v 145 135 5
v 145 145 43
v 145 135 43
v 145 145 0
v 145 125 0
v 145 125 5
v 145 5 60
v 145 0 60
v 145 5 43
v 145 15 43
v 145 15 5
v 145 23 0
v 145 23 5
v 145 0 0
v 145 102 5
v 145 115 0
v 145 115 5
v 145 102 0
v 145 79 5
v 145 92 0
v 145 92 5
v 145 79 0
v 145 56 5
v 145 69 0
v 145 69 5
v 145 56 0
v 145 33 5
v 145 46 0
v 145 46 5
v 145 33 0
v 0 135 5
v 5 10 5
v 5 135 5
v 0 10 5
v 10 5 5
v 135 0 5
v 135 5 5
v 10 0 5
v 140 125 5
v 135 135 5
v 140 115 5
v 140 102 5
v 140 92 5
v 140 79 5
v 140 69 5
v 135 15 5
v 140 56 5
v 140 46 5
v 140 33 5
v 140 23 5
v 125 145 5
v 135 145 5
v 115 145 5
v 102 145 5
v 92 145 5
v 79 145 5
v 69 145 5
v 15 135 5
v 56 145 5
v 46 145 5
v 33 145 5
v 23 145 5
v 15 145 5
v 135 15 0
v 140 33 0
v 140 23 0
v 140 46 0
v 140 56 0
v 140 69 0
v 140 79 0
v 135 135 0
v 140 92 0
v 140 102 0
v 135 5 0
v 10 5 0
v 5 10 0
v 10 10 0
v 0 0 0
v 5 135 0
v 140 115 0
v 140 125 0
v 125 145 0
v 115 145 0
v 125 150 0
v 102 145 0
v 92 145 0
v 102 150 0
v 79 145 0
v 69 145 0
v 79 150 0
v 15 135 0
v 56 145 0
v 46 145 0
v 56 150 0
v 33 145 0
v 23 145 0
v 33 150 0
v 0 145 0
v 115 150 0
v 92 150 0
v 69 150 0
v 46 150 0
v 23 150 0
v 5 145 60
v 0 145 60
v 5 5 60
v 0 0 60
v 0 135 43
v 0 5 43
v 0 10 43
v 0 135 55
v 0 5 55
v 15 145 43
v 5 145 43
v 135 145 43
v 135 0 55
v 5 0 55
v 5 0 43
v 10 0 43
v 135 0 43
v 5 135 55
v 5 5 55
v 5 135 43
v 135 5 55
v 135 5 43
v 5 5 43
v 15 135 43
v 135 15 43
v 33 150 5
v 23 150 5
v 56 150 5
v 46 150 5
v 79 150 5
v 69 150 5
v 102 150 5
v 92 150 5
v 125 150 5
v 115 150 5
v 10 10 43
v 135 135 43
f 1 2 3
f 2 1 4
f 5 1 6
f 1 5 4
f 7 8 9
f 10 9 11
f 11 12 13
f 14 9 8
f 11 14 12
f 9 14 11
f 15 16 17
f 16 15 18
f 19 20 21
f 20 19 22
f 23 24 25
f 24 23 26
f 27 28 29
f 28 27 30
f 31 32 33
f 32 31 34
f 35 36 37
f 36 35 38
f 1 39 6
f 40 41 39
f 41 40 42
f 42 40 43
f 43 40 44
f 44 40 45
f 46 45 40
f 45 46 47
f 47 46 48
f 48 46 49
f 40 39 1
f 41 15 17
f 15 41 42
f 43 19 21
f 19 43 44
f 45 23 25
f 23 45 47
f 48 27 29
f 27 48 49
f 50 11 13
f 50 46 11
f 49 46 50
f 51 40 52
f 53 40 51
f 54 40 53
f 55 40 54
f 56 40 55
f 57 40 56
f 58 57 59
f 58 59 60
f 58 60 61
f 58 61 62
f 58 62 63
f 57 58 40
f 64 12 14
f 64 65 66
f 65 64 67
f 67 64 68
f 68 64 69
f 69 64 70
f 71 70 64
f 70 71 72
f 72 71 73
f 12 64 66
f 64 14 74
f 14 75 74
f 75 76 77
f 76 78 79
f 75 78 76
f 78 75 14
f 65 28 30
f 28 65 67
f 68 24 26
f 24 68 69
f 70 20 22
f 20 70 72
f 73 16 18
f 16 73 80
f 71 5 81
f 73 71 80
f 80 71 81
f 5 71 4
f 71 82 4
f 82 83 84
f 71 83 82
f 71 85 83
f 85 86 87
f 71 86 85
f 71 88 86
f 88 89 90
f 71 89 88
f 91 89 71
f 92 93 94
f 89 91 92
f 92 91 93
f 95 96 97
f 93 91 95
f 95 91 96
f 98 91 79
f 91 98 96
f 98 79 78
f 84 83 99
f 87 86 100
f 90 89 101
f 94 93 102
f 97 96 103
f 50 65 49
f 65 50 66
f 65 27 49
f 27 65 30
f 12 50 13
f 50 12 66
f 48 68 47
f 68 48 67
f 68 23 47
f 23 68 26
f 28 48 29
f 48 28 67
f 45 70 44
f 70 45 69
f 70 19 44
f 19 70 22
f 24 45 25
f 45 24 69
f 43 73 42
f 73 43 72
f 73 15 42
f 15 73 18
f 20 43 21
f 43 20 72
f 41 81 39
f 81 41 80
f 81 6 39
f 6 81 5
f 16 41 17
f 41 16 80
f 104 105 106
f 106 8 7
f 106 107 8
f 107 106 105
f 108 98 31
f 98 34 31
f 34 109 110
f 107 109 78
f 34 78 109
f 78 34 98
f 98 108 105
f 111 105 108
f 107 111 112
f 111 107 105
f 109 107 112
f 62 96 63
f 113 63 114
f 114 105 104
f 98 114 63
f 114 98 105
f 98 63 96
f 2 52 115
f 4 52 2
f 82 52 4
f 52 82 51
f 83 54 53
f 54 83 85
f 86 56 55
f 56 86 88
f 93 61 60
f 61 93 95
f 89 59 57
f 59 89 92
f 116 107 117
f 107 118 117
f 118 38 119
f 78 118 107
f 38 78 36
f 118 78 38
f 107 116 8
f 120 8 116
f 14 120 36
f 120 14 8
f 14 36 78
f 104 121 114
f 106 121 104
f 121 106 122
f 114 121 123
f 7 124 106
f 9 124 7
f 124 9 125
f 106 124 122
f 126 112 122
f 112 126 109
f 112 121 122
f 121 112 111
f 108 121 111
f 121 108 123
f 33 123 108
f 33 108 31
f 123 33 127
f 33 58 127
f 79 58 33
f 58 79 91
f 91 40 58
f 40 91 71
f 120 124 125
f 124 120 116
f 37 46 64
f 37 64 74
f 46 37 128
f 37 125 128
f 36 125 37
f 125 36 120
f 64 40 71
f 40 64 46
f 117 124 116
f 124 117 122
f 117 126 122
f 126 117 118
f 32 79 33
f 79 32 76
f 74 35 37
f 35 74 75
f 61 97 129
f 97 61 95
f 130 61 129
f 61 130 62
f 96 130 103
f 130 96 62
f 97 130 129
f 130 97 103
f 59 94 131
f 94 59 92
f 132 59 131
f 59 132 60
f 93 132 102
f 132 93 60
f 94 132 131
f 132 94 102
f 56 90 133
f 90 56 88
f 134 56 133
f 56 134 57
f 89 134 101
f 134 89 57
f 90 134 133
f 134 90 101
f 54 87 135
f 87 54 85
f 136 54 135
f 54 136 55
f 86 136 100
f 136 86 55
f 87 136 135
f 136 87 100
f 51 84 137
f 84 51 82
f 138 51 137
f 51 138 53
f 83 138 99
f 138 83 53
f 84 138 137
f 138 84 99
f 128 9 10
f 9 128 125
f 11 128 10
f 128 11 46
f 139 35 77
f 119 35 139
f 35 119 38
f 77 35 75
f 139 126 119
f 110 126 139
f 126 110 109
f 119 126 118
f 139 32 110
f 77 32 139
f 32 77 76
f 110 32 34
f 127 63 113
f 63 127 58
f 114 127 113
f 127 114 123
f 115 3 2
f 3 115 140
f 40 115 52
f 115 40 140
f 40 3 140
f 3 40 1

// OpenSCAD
// roof is ~75mm
// fan is ~27mm tall
// put fan at 43mm, leaves 5mm
difference(){
    cube([145,145,60]);
    translate([5,5,5]){
        cube([140,140,70]);
    }
    translate([0, 5, 5]){
        cube([5, 130, 50]);
    }
    translate([5, 0, 5]){
        cube([130, 5, 50]);
    }
    translate([5, 5, 0]){
       cube([130, 130, 5]);
    }
    for(i = [1:5]){
        translate([140, i * 23, 0]){
            cube([5, 10, 5]);
        }
    }
}
translate([135,0,0]){
    cube([10, 15, 43]);
}
cube([10,10,43]);
translate([0, 135, 0]){
    cube([15,10,43]);
}
translate([135,135,0]){
    cube([10,10,43]);
}
for(i = [1:5]){
    translate([i * 23, 145, 0]){
        cube([10, 5, 5]);
    }
}
